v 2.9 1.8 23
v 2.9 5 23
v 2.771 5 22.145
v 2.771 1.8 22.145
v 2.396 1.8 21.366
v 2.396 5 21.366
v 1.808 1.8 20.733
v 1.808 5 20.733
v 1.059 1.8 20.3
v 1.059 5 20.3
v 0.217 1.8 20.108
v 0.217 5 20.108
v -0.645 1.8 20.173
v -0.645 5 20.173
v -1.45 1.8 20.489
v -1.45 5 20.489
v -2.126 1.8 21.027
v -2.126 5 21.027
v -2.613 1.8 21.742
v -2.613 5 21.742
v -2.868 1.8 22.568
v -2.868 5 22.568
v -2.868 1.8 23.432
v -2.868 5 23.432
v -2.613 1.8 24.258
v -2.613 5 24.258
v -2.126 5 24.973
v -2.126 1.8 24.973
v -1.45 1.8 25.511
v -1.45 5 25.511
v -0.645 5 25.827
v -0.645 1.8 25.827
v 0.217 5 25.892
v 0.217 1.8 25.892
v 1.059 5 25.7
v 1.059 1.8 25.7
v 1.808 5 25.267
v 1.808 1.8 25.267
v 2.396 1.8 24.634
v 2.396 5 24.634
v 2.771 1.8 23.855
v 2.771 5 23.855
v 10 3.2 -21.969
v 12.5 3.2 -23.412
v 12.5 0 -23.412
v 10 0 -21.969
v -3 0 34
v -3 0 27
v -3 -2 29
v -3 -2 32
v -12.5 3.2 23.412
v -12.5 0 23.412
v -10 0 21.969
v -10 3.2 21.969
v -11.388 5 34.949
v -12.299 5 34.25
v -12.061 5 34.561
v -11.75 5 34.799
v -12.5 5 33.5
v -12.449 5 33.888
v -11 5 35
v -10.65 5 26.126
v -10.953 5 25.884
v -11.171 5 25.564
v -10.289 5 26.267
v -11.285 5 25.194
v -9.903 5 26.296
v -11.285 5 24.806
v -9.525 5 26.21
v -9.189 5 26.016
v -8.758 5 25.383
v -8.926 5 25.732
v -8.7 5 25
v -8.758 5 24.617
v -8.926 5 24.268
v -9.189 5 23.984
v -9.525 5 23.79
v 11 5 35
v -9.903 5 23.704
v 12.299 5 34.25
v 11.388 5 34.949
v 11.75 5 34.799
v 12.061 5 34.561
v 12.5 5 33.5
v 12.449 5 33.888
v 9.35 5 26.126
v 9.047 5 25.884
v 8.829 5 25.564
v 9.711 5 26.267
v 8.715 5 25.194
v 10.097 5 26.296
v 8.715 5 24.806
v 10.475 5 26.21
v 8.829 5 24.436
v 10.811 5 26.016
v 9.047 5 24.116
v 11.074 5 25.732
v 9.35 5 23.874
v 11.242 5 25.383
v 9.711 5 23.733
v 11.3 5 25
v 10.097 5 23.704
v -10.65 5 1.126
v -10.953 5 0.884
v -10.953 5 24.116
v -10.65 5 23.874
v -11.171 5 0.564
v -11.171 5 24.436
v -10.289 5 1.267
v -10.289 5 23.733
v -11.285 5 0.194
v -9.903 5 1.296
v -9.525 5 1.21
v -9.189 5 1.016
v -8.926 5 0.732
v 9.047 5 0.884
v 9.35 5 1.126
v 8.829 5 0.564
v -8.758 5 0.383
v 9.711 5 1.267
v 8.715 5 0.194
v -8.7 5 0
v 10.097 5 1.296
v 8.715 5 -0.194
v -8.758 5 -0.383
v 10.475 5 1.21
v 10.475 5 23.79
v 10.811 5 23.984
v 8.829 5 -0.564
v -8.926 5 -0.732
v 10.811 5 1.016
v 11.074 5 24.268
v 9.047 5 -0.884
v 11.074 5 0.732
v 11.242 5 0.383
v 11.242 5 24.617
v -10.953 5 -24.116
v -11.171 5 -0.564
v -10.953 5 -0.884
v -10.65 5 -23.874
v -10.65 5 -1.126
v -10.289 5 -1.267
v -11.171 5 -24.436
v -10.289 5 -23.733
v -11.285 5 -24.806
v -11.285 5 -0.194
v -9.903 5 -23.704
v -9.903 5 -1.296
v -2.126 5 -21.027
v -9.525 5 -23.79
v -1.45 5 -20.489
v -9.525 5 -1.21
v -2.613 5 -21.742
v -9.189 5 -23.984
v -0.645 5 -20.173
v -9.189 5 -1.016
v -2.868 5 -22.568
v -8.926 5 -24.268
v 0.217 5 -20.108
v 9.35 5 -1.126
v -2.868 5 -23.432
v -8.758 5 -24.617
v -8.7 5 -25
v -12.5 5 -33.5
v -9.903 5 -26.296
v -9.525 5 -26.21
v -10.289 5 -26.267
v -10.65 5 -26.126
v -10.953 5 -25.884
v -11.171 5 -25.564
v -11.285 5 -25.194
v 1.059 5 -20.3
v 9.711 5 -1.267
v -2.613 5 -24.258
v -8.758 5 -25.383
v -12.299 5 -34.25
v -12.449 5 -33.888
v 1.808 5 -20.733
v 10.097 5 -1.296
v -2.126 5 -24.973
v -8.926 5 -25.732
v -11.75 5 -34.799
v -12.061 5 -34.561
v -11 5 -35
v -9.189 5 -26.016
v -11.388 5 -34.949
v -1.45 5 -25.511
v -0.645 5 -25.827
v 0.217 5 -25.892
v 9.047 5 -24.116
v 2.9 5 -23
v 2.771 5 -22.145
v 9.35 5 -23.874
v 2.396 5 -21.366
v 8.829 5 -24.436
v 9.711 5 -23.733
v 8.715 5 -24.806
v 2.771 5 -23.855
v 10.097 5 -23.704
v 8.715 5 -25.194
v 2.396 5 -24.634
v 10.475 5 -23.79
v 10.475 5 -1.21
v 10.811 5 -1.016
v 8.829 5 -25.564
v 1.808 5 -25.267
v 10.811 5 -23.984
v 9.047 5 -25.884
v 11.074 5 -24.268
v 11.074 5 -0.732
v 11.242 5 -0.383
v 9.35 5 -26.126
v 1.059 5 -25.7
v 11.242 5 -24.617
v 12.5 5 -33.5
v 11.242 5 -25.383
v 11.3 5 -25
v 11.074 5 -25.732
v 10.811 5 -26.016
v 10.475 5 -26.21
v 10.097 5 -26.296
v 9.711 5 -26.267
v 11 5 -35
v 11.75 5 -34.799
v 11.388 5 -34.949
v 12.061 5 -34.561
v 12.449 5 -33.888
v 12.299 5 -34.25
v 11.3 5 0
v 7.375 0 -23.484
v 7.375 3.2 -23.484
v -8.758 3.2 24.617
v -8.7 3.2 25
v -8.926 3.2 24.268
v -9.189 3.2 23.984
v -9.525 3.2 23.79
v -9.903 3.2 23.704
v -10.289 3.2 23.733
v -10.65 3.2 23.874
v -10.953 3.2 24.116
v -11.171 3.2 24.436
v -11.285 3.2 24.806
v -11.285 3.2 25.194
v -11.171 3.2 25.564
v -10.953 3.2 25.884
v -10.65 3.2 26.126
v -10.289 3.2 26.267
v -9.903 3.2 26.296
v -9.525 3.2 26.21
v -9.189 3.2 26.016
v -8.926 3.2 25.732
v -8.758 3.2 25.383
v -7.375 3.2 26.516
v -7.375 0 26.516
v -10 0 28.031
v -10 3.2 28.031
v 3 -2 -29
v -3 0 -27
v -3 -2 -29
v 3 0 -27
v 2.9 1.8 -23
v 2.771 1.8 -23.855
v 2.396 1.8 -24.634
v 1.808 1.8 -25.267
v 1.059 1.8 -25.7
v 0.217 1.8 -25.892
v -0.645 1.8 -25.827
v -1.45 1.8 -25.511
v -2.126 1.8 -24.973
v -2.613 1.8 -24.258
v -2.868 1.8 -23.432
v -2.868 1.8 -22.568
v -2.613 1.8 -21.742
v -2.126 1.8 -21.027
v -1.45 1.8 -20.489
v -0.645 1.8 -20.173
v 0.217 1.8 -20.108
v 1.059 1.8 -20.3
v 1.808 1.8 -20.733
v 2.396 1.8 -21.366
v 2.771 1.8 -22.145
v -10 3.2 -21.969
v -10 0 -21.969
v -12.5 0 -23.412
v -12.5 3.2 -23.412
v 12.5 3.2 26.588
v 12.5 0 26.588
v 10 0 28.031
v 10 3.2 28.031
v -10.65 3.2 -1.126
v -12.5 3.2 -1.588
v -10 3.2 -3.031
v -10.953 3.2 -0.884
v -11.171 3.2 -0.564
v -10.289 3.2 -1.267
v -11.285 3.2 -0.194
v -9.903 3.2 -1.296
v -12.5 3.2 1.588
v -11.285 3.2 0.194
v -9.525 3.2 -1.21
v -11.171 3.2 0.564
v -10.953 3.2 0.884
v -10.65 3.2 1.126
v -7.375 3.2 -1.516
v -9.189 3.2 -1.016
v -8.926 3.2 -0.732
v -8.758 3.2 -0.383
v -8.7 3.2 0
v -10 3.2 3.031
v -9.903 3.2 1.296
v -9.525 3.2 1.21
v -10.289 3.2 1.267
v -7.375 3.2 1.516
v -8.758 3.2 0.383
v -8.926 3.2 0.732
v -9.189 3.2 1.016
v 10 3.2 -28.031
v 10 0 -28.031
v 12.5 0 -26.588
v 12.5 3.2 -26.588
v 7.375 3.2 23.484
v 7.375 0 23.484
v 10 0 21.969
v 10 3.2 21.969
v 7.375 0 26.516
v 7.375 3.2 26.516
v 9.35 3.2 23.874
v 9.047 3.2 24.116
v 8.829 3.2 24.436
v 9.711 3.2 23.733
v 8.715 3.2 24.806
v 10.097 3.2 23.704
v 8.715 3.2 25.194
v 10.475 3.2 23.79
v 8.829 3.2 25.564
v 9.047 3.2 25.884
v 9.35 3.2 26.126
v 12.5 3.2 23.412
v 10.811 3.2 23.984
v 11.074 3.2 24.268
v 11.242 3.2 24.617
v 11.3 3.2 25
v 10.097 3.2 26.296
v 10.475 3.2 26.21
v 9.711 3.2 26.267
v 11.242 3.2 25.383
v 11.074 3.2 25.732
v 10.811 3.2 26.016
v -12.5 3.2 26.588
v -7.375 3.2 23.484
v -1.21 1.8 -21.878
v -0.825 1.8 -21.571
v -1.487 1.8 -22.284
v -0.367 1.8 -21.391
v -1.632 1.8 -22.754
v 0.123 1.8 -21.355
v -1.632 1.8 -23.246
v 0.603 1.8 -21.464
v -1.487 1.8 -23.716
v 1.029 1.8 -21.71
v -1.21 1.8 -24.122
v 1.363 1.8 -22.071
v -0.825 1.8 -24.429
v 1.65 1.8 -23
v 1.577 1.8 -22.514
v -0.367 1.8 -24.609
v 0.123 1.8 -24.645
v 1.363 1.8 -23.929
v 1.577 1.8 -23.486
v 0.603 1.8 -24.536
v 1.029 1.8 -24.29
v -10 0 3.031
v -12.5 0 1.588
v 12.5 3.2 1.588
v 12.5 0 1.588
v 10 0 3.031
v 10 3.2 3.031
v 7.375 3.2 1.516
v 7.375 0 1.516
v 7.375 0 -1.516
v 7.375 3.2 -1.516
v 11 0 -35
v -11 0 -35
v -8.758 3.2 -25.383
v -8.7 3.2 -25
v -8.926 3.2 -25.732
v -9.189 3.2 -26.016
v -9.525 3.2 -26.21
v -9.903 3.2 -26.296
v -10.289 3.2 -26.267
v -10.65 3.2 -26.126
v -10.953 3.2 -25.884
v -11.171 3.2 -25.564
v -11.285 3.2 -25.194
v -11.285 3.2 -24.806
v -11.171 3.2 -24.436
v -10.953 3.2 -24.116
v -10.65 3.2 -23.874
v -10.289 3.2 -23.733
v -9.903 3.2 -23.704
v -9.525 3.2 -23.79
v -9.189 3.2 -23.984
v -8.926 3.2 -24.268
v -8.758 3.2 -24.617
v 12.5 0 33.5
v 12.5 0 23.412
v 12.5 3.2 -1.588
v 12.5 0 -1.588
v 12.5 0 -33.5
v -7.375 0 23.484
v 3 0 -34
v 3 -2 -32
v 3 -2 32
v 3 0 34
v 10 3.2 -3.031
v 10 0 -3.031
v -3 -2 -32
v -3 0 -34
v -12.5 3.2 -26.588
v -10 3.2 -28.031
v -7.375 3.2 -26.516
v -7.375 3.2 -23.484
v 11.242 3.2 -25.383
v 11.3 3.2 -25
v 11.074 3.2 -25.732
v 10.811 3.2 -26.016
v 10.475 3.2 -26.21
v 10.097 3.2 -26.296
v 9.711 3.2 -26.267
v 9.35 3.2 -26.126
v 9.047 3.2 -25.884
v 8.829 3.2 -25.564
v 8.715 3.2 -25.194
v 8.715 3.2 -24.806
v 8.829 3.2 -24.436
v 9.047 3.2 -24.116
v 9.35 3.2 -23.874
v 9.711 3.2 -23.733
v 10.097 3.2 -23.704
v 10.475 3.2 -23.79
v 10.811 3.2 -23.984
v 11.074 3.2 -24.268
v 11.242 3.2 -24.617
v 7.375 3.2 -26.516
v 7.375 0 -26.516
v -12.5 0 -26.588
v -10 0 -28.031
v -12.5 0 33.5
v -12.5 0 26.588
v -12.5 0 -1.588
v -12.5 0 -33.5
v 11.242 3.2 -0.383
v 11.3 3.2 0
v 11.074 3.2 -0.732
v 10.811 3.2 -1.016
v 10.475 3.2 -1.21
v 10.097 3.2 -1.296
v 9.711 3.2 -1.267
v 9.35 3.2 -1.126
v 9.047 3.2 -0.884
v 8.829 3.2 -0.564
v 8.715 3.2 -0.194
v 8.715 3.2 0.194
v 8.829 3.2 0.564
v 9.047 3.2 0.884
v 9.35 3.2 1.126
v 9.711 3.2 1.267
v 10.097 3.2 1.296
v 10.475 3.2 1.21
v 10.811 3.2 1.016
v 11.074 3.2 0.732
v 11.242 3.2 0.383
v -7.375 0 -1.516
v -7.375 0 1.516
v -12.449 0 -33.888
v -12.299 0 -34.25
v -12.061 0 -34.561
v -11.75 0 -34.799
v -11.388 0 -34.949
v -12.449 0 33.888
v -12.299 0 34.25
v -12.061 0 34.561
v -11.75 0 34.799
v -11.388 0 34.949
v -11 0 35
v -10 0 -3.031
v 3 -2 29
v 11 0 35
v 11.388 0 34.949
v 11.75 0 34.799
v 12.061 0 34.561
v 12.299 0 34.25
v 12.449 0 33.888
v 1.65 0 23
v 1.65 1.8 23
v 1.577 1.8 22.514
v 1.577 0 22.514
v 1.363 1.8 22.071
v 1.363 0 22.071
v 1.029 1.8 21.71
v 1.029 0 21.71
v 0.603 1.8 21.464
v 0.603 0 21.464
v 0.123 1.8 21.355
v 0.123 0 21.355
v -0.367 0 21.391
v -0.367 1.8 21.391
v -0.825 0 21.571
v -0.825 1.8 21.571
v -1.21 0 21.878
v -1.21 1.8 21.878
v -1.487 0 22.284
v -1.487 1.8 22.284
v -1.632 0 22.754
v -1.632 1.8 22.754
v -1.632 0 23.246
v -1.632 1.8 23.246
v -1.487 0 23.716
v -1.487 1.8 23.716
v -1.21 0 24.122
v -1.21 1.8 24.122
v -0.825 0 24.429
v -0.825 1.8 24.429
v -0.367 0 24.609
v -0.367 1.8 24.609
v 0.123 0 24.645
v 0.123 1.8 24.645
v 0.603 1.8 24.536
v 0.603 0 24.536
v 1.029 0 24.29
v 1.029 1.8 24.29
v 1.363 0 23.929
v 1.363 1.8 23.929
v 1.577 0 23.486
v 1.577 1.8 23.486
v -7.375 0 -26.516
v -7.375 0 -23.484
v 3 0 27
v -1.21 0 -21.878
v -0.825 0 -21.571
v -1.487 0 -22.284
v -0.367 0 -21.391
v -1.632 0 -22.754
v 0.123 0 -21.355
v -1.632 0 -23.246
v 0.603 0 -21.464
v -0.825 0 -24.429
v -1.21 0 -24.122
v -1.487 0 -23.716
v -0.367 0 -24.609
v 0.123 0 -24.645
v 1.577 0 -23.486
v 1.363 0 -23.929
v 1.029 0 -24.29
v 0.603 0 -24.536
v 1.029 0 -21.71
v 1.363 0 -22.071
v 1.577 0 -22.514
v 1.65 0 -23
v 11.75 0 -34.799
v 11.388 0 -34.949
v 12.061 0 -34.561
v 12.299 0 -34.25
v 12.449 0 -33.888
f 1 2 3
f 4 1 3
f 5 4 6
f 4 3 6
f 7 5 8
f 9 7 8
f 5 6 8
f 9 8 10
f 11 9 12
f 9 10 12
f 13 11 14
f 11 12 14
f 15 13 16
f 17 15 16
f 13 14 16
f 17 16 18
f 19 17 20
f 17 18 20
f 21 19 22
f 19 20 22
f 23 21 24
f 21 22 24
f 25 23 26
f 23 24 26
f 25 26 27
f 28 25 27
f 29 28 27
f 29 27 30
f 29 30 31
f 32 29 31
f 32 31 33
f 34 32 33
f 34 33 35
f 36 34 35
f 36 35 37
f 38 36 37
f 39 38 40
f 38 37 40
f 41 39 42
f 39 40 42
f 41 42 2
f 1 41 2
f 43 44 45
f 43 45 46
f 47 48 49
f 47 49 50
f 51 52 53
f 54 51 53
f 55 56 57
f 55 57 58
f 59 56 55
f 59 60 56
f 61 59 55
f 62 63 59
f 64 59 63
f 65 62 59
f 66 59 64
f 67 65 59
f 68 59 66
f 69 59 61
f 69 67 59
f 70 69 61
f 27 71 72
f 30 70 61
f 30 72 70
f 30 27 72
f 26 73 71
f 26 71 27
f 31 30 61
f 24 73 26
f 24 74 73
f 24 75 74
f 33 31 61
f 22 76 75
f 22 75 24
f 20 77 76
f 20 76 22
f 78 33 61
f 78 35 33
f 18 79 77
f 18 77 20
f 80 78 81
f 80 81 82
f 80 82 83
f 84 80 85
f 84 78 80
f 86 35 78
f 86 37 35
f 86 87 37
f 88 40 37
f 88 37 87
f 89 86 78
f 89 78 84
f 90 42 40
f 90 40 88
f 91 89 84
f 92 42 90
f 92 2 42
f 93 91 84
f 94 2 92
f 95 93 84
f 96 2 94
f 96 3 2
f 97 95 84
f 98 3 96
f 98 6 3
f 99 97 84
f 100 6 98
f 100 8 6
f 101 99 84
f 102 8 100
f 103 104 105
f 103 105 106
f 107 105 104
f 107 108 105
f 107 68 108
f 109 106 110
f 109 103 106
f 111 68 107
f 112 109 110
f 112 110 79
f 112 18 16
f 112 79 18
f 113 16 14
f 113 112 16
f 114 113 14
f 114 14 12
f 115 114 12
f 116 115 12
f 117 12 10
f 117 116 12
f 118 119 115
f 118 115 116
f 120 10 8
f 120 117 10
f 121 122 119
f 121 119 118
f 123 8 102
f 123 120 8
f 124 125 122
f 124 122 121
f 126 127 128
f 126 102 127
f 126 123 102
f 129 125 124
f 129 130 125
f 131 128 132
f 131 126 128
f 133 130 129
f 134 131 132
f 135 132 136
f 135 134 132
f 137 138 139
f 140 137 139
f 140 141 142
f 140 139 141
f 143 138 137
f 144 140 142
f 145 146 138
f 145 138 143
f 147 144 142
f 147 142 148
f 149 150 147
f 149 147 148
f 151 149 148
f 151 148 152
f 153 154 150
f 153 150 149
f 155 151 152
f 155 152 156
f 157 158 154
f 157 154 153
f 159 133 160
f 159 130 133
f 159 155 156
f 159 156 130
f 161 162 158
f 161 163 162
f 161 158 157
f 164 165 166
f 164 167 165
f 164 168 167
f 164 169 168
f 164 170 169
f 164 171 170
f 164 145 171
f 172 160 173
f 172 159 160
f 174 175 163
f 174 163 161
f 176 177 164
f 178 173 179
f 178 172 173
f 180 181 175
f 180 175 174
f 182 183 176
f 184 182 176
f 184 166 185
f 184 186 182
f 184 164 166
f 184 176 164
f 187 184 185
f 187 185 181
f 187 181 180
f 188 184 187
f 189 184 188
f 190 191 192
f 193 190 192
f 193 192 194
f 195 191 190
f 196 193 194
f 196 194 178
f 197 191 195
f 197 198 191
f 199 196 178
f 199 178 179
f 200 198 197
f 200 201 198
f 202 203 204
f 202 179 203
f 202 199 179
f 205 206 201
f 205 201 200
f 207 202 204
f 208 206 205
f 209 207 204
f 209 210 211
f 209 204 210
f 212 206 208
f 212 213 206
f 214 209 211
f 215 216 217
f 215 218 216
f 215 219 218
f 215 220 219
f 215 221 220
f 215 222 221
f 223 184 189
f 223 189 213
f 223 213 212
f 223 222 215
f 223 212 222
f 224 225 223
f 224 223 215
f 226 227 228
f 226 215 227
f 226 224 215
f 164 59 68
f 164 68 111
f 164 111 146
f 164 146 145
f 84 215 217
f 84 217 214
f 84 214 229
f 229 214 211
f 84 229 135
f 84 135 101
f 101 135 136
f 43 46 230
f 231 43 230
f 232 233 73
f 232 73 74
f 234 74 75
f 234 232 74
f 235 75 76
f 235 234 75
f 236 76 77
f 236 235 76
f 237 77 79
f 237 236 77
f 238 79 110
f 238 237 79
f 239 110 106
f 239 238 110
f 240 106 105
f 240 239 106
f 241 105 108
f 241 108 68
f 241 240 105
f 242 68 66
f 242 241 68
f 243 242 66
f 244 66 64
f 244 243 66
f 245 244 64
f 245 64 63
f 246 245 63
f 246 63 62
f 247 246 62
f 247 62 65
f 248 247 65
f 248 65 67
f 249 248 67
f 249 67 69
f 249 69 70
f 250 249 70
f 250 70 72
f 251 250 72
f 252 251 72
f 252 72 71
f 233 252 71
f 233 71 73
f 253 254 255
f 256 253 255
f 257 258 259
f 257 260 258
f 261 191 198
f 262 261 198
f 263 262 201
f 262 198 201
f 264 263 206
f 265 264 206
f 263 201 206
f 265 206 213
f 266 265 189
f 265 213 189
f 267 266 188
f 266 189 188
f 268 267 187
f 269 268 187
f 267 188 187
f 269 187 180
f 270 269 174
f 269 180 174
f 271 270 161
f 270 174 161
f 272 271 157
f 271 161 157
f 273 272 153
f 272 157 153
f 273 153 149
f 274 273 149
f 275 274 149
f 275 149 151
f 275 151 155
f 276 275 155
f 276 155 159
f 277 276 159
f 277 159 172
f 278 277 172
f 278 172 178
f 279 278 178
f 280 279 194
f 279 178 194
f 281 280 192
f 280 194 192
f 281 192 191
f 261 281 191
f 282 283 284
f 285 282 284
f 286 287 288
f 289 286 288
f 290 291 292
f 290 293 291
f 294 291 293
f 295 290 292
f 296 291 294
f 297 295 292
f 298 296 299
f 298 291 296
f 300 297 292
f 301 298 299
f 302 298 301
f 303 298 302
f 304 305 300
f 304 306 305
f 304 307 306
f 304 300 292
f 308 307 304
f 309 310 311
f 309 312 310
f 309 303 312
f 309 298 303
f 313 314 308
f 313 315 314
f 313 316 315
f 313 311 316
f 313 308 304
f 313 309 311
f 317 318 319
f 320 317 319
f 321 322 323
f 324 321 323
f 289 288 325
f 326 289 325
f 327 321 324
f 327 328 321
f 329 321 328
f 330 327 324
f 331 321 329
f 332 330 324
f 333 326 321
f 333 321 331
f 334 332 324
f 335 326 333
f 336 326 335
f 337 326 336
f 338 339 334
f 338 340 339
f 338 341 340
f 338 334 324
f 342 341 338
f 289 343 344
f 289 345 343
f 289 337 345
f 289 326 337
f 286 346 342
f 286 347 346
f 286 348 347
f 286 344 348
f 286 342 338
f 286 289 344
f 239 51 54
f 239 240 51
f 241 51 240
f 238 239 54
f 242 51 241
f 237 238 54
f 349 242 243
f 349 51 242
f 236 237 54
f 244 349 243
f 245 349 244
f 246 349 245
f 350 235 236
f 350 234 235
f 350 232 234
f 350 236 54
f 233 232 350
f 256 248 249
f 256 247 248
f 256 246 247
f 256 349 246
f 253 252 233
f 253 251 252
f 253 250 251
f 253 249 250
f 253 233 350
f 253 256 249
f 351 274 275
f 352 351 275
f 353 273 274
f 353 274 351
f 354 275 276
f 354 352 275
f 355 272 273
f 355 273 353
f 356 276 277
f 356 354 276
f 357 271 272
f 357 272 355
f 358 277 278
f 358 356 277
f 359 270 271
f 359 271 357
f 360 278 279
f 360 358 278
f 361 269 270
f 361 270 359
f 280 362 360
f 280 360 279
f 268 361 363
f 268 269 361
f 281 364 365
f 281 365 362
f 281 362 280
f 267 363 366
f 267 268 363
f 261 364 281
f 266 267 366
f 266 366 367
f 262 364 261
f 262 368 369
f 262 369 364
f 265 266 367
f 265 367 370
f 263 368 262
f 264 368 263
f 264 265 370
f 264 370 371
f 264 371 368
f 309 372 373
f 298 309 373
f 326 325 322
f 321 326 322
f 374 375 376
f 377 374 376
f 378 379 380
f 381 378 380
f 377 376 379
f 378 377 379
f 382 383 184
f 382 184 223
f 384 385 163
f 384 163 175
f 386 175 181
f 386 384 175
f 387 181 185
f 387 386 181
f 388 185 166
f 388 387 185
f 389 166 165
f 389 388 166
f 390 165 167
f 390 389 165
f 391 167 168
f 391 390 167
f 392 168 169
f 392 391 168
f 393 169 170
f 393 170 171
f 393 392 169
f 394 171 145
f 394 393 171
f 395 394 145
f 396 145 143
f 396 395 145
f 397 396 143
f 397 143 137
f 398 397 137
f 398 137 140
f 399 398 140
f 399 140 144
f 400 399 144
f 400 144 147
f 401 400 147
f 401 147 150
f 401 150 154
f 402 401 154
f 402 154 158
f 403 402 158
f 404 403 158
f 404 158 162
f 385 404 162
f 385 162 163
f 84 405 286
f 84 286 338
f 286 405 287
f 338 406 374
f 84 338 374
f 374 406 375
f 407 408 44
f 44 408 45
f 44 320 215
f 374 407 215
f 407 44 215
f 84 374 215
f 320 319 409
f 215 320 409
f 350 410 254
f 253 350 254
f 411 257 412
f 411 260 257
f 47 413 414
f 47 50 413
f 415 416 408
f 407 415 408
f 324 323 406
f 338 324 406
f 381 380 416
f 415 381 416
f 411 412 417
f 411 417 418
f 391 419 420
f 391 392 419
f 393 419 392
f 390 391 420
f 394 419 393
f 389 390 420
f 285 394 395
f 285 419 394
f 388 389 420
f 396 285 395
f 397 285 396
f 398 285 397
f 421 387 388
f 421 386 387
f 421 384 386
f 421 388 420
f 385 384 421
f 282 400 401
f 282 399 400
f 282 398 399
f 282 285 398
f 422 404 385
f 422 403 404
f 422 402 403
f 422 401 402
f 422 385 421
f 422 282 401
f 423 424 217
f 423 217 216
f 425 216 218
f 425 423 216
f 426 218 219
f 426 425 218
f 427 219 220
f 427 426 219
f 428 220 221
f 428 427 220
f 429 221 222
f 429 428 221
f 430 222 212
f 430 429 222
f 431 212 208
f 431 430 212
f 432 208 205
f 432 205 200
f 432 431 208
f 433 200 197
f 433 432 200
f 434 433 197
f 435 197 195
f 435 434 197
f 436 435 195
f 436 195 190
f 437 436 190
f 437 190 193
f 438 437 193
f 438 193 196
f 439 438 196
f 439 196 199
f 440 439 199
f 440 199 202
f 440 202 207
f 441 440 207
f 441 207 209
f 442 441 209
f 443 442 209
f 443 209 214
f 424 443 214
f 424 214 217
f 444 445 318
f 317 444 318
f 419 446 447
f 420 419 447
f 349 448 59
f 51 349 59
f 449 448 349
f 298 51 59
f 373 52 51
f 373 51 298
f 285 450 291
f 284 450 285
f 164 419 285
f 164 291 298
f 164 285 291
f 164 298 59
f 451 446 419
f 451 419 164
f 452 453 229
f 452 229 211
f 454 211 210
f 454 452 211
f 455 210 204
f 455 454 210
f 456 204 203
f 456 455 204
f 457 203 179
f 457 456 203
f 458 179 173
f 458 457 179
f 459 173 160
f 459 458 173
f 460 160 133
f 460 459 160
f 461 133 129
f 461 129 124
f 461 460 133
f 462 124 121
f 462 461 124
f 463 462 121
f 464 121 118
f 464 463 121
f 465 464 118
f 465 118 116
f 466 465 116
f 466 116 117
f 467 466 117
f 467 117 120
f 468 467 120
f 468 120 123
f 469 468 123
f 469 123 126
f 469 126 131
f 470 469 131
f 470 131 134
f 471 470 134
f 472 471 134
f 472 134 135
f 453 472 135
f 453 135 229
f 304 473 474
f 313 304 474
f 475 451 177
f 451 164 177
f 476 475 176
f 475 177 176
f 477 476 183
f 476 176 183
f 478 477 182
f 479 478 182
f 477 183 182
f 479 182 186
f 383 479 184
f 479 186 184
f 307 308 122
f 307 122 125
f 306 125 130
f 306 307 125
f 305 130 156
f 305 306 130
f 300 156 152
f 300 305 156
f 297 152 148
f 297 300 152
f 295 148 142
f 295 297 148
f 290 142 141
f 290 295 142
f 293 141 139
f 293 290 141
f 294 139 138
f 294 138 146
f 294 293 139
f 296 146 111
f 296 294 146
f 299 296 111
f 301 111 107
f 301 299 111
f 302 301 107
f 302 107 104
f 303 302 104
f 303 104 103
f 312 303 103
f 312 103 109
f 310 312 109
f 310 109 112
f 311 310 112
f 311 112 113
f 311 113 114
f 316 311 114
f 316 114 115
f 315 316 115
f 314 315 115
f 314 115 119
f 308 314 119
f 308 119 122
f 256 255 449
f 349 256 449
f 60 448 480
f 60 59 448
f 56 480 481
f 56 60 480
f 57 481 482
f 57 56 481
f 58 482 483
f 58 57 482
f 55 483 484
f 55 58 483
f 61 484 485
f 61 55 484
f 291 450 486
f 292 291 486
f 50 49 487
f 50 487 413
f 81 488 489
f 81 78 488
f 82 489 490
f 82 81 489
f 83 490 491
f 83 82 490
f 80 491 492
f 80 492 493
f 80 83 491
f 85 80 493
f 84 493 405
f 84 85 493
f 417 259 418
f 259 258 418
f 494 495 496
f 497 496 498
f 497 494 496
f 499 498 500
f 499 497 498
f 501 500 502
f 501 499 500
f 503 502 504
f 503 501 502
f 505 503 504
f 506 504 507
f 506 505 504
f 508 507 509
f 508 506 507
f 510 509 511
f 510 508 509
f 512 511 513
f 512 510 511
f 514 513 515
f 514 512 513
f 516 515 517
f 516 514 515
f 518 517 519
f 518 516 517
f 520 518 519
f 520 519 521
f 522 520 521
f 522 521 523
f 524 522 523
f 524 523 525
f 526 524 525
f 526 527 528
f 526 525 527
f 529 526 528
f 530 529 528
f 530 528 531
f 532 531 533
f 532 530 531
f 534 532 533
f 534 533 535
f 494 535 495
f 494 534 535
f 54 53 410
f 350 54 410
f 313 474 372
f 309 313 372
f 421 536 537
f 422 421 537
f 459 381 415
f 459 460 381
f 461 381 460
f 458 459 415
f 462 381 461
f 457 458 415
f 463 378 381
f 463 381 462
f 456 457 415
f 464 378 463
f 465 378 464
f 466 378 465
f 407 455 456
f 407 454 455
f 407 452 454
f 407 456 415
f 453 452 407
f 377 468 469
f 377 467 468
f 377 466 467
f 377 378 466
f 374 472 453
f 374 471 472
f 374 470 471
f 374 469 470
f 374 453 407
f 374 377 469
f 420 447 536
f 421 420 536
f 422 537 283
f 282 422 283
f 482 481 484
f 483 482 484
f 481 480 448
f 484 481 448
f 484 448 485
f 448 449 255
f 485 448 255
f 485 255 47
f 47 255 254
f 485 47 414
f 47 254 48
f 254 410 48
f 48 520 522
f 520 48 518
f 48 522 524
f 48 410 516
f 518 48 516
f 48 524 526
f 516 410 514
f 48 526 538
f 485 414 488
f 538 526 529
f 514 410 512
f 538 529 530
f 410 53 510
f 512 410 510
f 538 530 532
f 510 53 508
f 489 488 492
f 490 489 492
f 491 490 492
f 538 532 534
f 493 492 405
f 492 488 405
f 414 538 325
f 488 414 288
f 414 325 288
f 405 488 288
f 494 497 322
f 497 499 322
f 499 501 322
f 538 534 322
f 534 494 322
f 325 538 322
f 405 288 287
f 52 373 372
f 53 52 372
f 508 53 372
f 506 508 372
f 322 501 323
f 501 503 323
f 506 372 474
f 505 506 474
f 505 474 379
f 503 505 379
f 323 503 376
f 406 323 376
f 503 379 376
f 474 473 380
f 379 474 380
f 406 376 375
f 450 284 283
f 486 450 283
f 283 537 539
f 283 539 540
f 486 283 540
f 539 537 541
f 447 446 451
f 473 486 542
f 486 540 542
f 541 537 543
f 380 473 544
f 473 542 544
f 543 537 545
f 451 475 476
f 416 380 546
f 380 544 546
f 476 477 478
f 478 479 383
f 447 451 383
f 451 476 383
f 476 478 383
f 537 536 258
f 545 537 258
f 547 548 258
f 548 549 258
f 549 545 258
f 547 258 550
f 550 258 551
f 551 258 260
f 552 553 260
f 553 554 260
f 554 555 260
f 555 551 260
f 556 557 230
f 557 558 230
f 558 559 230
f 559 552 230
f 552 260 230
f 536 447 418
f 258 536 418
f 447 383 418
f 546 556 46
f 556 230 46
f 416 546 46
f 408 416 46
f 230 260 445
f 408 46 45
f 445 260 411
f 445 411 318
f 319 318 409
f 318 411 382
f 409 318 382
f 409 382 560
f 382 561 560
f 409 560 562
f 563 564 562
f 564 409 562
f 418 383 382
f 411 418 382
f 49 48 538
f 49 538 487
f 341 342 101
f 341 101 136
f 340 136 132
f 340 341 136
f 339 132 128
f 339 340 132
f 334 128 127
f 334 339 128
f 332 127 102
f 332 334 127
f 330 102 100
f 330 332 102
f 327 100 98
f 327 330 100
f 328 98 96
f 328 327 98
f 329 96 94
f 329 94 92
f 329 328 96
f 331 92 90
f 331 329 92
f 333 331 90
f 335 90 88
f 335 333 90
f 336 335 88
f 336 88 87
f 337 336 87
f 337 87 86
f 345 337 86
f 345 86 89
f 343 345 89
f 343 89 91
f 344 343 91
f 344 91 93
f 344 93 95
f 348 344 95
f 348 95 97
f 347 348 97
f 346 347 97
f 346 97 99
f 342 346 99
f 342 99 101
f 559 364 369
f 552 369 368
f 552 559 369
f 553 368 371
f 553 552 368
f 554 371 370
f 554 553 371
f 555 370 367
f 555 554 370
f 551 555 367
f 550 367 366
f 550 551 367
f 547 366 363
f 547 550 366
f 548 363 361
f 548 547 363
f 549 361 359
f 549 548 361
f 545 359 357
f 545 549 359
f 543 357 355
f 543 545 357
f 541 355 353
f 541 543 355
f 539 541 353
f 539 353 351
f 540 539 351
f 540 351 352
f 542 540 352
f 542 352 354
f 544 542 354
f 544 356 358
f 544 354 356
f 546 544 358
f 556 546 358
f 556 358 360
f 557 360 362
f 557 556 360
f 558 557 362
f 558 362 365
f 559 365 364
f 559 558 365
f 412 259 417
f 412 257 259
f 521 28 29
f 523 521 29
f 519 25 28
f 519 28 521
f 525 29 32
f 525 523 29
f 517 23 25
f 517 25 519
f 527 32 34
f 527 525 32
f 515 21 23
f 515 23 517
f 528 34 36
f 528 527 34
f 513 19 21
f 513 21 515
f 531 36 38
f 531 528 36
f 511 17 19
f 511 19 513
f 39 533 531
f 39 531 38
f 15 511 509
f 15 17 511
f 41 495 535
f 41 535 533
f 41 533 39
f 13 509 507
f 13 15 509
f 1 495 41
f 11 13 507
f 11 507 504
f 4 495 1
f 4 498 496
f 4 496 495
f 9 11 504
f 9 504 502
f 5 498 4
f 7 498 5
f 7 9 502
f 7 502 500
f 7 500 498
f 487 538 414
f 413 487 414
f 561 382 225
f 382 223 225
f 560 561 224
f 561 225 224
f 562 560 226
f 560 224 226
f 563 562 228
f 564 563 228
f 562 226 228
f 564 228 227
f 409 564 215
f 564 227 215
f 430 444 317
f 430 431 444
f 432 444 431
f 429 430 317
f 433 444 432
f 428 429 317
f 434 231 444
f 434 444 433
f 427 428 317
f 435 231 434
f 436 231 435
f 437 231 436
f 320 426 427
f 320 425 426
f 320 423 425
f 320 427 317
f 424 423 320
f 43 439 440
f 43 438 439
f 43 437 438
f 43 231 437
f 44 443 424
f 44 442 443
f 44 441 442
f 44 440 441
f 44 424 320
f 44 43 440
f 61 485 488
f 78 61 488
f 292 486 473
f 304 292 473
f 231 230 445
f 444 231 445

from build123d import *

# Parameters (mm, degrees)
SKETCH_1_W          = 25
SKETCH_1_H          = 70
SKETCH_1_R          = 1.3
SKETCH_1_R_2        = 1.65
EXTRUDE_1_DEPTH     = 5
SKETCH_2_R          = 2.9
CUT_EXTRUDE_1_DEPTH = 3.2
CUT_EXTRUDE_2_DEPTH = 3.2
FILLET_1_R          = 1.5
EXTRUDE_2_DEPTH     = 3


with BuildPart() as part:
    # 草图1 → 凸台-拉伸1 (new body)
    with BuildSketch(Plane(origin=(0, 0, 0), x_dir=(1, 0, 0), z_dir=(0, 1, 0))):
        Rectangle(SKETCH_1_W, SKETCH_1_H)
        with Locations((10, 25)):
            Circle(SKETCH_1_R, mode=Mode.SUBTRACT)
        with Locations((10, 0)):
            Circle(SKETCH_1_R, mode=Mode.SUBTRACT)
        with Locations((10, -25)):
            Circle(SKETCH_1_R, mode=Mode.SUBTRACT)
        with Locations((0, 23)):
            Circle(SKETCH_1_R_2, mode=Mode.SUBTRACT)
        with Locations((0, -23)):
            Circle(SKETCH_1_R_2, mode=Mode.SUBTRACT)
        with Locations((-10, 25)):
            Circle(SKETCH_1_R, mode=Mode.SUBTRACT)
        with Locations((-10, 0)):
            Circle(SKETCH_1_R, mode=Mode.SUBTRACT)
        with Locations((-10, -25)):
            Circle(SKETCH_1_R, mode=Mode.SUBTRACT)
    extrude(amount=EXTRUDE_1_DEPTH)

    # 草图2 → 切除-拉伸1 (cut)
    with BuildSketch(Plane(origin=(0, 5, 0), x_dir=(1, 0, 0), z_dir=(0, 1, 0))):
        with Locations((0, 23)):
            Circle(SKETCH_2_R)
        with Locations((0, -23)):
            Circle(SKETCH_2_R)
    extrude(amount=-CUT_EXTRUDE_1_DEPTH, mode=Mode.SUBTRACT)

    # 草图3 → 切除-拉伸2 (cut)
    with BuildSketch(Plane.XZ):
        Polygon((-7.375, 23.484455543), (-7.375, 26.515544457), (-10, 28.031088913), (-12.625, 26.515544457), (-12.625, 23.484455543), (-10, 21.968911087), align=None)
        Polygon((10, 28.031088913), (7.375, 26.515544457), (7.375, 23.484455543), (10, 21.968911087), (12.625, 23.484455543), (12.625, 26.515544457), align=None)
        Polygon((10, 3.031088913), (7.375, 1.515544457), (7.375, -1.515544457), (10, -3.031088913), (12.625, -1.515544457), (12.625, 1.515544457), align=None)
        Polygon((-10, 3.031088913), (-12.625, 1.515544457), (-12.625, -1.515544457), (-10, -3.031088913), (-7.375, -1.515544457), (-7.375, 1.515544457), align=None)
        Polygon((-7.375, -26.515544457), (-7.375, -23.484455543), (-10, -21.968911087), (-12.625, -23.484455543), (-12.625, -26.515544457), (-10, -28.031088913), align=None)
        Polygon((10, -21.968911087), (7.375, -23.484455543), (7.375, -26.515544457), (10, -28.031088913), (12.625, -26.515544457), (12.625, -23.484455543), align=None)
    extrude(amount=-CUT_EXTRUDE_2_DEPTH, mode=Mode.SUBTRACT)

    # 圆角1
    fillet_1_edges = [part.edges().sort_by_distance(p)[0] for p in [
        (12.5, 2.5, 35),
        (-12.5, 2.5, 35),
        (-12.5, 2.5, -35),
        (12.5, 2.5, -35),
    ]]
    fillet(fillet_1_edges, radius=FILLET_1_R)

    # 草图4 → 凸台-拉伸2 (add, symmetric)
    with BuildSketch(Plane(origin=(0, 0, 0), x_dir=(0, 0, -1), z_dir=(1, 0, 0))):
        Polygon((-34, 0), (-27, 0), (-29, -2), (-32, -2), align=None)
        Polygon((29, -2), (32, -2), (34, 0), (27, 0), align=None)
    extrude(amount=EXTRUDE_2_DEPTH, both=True)


solid = part.part
